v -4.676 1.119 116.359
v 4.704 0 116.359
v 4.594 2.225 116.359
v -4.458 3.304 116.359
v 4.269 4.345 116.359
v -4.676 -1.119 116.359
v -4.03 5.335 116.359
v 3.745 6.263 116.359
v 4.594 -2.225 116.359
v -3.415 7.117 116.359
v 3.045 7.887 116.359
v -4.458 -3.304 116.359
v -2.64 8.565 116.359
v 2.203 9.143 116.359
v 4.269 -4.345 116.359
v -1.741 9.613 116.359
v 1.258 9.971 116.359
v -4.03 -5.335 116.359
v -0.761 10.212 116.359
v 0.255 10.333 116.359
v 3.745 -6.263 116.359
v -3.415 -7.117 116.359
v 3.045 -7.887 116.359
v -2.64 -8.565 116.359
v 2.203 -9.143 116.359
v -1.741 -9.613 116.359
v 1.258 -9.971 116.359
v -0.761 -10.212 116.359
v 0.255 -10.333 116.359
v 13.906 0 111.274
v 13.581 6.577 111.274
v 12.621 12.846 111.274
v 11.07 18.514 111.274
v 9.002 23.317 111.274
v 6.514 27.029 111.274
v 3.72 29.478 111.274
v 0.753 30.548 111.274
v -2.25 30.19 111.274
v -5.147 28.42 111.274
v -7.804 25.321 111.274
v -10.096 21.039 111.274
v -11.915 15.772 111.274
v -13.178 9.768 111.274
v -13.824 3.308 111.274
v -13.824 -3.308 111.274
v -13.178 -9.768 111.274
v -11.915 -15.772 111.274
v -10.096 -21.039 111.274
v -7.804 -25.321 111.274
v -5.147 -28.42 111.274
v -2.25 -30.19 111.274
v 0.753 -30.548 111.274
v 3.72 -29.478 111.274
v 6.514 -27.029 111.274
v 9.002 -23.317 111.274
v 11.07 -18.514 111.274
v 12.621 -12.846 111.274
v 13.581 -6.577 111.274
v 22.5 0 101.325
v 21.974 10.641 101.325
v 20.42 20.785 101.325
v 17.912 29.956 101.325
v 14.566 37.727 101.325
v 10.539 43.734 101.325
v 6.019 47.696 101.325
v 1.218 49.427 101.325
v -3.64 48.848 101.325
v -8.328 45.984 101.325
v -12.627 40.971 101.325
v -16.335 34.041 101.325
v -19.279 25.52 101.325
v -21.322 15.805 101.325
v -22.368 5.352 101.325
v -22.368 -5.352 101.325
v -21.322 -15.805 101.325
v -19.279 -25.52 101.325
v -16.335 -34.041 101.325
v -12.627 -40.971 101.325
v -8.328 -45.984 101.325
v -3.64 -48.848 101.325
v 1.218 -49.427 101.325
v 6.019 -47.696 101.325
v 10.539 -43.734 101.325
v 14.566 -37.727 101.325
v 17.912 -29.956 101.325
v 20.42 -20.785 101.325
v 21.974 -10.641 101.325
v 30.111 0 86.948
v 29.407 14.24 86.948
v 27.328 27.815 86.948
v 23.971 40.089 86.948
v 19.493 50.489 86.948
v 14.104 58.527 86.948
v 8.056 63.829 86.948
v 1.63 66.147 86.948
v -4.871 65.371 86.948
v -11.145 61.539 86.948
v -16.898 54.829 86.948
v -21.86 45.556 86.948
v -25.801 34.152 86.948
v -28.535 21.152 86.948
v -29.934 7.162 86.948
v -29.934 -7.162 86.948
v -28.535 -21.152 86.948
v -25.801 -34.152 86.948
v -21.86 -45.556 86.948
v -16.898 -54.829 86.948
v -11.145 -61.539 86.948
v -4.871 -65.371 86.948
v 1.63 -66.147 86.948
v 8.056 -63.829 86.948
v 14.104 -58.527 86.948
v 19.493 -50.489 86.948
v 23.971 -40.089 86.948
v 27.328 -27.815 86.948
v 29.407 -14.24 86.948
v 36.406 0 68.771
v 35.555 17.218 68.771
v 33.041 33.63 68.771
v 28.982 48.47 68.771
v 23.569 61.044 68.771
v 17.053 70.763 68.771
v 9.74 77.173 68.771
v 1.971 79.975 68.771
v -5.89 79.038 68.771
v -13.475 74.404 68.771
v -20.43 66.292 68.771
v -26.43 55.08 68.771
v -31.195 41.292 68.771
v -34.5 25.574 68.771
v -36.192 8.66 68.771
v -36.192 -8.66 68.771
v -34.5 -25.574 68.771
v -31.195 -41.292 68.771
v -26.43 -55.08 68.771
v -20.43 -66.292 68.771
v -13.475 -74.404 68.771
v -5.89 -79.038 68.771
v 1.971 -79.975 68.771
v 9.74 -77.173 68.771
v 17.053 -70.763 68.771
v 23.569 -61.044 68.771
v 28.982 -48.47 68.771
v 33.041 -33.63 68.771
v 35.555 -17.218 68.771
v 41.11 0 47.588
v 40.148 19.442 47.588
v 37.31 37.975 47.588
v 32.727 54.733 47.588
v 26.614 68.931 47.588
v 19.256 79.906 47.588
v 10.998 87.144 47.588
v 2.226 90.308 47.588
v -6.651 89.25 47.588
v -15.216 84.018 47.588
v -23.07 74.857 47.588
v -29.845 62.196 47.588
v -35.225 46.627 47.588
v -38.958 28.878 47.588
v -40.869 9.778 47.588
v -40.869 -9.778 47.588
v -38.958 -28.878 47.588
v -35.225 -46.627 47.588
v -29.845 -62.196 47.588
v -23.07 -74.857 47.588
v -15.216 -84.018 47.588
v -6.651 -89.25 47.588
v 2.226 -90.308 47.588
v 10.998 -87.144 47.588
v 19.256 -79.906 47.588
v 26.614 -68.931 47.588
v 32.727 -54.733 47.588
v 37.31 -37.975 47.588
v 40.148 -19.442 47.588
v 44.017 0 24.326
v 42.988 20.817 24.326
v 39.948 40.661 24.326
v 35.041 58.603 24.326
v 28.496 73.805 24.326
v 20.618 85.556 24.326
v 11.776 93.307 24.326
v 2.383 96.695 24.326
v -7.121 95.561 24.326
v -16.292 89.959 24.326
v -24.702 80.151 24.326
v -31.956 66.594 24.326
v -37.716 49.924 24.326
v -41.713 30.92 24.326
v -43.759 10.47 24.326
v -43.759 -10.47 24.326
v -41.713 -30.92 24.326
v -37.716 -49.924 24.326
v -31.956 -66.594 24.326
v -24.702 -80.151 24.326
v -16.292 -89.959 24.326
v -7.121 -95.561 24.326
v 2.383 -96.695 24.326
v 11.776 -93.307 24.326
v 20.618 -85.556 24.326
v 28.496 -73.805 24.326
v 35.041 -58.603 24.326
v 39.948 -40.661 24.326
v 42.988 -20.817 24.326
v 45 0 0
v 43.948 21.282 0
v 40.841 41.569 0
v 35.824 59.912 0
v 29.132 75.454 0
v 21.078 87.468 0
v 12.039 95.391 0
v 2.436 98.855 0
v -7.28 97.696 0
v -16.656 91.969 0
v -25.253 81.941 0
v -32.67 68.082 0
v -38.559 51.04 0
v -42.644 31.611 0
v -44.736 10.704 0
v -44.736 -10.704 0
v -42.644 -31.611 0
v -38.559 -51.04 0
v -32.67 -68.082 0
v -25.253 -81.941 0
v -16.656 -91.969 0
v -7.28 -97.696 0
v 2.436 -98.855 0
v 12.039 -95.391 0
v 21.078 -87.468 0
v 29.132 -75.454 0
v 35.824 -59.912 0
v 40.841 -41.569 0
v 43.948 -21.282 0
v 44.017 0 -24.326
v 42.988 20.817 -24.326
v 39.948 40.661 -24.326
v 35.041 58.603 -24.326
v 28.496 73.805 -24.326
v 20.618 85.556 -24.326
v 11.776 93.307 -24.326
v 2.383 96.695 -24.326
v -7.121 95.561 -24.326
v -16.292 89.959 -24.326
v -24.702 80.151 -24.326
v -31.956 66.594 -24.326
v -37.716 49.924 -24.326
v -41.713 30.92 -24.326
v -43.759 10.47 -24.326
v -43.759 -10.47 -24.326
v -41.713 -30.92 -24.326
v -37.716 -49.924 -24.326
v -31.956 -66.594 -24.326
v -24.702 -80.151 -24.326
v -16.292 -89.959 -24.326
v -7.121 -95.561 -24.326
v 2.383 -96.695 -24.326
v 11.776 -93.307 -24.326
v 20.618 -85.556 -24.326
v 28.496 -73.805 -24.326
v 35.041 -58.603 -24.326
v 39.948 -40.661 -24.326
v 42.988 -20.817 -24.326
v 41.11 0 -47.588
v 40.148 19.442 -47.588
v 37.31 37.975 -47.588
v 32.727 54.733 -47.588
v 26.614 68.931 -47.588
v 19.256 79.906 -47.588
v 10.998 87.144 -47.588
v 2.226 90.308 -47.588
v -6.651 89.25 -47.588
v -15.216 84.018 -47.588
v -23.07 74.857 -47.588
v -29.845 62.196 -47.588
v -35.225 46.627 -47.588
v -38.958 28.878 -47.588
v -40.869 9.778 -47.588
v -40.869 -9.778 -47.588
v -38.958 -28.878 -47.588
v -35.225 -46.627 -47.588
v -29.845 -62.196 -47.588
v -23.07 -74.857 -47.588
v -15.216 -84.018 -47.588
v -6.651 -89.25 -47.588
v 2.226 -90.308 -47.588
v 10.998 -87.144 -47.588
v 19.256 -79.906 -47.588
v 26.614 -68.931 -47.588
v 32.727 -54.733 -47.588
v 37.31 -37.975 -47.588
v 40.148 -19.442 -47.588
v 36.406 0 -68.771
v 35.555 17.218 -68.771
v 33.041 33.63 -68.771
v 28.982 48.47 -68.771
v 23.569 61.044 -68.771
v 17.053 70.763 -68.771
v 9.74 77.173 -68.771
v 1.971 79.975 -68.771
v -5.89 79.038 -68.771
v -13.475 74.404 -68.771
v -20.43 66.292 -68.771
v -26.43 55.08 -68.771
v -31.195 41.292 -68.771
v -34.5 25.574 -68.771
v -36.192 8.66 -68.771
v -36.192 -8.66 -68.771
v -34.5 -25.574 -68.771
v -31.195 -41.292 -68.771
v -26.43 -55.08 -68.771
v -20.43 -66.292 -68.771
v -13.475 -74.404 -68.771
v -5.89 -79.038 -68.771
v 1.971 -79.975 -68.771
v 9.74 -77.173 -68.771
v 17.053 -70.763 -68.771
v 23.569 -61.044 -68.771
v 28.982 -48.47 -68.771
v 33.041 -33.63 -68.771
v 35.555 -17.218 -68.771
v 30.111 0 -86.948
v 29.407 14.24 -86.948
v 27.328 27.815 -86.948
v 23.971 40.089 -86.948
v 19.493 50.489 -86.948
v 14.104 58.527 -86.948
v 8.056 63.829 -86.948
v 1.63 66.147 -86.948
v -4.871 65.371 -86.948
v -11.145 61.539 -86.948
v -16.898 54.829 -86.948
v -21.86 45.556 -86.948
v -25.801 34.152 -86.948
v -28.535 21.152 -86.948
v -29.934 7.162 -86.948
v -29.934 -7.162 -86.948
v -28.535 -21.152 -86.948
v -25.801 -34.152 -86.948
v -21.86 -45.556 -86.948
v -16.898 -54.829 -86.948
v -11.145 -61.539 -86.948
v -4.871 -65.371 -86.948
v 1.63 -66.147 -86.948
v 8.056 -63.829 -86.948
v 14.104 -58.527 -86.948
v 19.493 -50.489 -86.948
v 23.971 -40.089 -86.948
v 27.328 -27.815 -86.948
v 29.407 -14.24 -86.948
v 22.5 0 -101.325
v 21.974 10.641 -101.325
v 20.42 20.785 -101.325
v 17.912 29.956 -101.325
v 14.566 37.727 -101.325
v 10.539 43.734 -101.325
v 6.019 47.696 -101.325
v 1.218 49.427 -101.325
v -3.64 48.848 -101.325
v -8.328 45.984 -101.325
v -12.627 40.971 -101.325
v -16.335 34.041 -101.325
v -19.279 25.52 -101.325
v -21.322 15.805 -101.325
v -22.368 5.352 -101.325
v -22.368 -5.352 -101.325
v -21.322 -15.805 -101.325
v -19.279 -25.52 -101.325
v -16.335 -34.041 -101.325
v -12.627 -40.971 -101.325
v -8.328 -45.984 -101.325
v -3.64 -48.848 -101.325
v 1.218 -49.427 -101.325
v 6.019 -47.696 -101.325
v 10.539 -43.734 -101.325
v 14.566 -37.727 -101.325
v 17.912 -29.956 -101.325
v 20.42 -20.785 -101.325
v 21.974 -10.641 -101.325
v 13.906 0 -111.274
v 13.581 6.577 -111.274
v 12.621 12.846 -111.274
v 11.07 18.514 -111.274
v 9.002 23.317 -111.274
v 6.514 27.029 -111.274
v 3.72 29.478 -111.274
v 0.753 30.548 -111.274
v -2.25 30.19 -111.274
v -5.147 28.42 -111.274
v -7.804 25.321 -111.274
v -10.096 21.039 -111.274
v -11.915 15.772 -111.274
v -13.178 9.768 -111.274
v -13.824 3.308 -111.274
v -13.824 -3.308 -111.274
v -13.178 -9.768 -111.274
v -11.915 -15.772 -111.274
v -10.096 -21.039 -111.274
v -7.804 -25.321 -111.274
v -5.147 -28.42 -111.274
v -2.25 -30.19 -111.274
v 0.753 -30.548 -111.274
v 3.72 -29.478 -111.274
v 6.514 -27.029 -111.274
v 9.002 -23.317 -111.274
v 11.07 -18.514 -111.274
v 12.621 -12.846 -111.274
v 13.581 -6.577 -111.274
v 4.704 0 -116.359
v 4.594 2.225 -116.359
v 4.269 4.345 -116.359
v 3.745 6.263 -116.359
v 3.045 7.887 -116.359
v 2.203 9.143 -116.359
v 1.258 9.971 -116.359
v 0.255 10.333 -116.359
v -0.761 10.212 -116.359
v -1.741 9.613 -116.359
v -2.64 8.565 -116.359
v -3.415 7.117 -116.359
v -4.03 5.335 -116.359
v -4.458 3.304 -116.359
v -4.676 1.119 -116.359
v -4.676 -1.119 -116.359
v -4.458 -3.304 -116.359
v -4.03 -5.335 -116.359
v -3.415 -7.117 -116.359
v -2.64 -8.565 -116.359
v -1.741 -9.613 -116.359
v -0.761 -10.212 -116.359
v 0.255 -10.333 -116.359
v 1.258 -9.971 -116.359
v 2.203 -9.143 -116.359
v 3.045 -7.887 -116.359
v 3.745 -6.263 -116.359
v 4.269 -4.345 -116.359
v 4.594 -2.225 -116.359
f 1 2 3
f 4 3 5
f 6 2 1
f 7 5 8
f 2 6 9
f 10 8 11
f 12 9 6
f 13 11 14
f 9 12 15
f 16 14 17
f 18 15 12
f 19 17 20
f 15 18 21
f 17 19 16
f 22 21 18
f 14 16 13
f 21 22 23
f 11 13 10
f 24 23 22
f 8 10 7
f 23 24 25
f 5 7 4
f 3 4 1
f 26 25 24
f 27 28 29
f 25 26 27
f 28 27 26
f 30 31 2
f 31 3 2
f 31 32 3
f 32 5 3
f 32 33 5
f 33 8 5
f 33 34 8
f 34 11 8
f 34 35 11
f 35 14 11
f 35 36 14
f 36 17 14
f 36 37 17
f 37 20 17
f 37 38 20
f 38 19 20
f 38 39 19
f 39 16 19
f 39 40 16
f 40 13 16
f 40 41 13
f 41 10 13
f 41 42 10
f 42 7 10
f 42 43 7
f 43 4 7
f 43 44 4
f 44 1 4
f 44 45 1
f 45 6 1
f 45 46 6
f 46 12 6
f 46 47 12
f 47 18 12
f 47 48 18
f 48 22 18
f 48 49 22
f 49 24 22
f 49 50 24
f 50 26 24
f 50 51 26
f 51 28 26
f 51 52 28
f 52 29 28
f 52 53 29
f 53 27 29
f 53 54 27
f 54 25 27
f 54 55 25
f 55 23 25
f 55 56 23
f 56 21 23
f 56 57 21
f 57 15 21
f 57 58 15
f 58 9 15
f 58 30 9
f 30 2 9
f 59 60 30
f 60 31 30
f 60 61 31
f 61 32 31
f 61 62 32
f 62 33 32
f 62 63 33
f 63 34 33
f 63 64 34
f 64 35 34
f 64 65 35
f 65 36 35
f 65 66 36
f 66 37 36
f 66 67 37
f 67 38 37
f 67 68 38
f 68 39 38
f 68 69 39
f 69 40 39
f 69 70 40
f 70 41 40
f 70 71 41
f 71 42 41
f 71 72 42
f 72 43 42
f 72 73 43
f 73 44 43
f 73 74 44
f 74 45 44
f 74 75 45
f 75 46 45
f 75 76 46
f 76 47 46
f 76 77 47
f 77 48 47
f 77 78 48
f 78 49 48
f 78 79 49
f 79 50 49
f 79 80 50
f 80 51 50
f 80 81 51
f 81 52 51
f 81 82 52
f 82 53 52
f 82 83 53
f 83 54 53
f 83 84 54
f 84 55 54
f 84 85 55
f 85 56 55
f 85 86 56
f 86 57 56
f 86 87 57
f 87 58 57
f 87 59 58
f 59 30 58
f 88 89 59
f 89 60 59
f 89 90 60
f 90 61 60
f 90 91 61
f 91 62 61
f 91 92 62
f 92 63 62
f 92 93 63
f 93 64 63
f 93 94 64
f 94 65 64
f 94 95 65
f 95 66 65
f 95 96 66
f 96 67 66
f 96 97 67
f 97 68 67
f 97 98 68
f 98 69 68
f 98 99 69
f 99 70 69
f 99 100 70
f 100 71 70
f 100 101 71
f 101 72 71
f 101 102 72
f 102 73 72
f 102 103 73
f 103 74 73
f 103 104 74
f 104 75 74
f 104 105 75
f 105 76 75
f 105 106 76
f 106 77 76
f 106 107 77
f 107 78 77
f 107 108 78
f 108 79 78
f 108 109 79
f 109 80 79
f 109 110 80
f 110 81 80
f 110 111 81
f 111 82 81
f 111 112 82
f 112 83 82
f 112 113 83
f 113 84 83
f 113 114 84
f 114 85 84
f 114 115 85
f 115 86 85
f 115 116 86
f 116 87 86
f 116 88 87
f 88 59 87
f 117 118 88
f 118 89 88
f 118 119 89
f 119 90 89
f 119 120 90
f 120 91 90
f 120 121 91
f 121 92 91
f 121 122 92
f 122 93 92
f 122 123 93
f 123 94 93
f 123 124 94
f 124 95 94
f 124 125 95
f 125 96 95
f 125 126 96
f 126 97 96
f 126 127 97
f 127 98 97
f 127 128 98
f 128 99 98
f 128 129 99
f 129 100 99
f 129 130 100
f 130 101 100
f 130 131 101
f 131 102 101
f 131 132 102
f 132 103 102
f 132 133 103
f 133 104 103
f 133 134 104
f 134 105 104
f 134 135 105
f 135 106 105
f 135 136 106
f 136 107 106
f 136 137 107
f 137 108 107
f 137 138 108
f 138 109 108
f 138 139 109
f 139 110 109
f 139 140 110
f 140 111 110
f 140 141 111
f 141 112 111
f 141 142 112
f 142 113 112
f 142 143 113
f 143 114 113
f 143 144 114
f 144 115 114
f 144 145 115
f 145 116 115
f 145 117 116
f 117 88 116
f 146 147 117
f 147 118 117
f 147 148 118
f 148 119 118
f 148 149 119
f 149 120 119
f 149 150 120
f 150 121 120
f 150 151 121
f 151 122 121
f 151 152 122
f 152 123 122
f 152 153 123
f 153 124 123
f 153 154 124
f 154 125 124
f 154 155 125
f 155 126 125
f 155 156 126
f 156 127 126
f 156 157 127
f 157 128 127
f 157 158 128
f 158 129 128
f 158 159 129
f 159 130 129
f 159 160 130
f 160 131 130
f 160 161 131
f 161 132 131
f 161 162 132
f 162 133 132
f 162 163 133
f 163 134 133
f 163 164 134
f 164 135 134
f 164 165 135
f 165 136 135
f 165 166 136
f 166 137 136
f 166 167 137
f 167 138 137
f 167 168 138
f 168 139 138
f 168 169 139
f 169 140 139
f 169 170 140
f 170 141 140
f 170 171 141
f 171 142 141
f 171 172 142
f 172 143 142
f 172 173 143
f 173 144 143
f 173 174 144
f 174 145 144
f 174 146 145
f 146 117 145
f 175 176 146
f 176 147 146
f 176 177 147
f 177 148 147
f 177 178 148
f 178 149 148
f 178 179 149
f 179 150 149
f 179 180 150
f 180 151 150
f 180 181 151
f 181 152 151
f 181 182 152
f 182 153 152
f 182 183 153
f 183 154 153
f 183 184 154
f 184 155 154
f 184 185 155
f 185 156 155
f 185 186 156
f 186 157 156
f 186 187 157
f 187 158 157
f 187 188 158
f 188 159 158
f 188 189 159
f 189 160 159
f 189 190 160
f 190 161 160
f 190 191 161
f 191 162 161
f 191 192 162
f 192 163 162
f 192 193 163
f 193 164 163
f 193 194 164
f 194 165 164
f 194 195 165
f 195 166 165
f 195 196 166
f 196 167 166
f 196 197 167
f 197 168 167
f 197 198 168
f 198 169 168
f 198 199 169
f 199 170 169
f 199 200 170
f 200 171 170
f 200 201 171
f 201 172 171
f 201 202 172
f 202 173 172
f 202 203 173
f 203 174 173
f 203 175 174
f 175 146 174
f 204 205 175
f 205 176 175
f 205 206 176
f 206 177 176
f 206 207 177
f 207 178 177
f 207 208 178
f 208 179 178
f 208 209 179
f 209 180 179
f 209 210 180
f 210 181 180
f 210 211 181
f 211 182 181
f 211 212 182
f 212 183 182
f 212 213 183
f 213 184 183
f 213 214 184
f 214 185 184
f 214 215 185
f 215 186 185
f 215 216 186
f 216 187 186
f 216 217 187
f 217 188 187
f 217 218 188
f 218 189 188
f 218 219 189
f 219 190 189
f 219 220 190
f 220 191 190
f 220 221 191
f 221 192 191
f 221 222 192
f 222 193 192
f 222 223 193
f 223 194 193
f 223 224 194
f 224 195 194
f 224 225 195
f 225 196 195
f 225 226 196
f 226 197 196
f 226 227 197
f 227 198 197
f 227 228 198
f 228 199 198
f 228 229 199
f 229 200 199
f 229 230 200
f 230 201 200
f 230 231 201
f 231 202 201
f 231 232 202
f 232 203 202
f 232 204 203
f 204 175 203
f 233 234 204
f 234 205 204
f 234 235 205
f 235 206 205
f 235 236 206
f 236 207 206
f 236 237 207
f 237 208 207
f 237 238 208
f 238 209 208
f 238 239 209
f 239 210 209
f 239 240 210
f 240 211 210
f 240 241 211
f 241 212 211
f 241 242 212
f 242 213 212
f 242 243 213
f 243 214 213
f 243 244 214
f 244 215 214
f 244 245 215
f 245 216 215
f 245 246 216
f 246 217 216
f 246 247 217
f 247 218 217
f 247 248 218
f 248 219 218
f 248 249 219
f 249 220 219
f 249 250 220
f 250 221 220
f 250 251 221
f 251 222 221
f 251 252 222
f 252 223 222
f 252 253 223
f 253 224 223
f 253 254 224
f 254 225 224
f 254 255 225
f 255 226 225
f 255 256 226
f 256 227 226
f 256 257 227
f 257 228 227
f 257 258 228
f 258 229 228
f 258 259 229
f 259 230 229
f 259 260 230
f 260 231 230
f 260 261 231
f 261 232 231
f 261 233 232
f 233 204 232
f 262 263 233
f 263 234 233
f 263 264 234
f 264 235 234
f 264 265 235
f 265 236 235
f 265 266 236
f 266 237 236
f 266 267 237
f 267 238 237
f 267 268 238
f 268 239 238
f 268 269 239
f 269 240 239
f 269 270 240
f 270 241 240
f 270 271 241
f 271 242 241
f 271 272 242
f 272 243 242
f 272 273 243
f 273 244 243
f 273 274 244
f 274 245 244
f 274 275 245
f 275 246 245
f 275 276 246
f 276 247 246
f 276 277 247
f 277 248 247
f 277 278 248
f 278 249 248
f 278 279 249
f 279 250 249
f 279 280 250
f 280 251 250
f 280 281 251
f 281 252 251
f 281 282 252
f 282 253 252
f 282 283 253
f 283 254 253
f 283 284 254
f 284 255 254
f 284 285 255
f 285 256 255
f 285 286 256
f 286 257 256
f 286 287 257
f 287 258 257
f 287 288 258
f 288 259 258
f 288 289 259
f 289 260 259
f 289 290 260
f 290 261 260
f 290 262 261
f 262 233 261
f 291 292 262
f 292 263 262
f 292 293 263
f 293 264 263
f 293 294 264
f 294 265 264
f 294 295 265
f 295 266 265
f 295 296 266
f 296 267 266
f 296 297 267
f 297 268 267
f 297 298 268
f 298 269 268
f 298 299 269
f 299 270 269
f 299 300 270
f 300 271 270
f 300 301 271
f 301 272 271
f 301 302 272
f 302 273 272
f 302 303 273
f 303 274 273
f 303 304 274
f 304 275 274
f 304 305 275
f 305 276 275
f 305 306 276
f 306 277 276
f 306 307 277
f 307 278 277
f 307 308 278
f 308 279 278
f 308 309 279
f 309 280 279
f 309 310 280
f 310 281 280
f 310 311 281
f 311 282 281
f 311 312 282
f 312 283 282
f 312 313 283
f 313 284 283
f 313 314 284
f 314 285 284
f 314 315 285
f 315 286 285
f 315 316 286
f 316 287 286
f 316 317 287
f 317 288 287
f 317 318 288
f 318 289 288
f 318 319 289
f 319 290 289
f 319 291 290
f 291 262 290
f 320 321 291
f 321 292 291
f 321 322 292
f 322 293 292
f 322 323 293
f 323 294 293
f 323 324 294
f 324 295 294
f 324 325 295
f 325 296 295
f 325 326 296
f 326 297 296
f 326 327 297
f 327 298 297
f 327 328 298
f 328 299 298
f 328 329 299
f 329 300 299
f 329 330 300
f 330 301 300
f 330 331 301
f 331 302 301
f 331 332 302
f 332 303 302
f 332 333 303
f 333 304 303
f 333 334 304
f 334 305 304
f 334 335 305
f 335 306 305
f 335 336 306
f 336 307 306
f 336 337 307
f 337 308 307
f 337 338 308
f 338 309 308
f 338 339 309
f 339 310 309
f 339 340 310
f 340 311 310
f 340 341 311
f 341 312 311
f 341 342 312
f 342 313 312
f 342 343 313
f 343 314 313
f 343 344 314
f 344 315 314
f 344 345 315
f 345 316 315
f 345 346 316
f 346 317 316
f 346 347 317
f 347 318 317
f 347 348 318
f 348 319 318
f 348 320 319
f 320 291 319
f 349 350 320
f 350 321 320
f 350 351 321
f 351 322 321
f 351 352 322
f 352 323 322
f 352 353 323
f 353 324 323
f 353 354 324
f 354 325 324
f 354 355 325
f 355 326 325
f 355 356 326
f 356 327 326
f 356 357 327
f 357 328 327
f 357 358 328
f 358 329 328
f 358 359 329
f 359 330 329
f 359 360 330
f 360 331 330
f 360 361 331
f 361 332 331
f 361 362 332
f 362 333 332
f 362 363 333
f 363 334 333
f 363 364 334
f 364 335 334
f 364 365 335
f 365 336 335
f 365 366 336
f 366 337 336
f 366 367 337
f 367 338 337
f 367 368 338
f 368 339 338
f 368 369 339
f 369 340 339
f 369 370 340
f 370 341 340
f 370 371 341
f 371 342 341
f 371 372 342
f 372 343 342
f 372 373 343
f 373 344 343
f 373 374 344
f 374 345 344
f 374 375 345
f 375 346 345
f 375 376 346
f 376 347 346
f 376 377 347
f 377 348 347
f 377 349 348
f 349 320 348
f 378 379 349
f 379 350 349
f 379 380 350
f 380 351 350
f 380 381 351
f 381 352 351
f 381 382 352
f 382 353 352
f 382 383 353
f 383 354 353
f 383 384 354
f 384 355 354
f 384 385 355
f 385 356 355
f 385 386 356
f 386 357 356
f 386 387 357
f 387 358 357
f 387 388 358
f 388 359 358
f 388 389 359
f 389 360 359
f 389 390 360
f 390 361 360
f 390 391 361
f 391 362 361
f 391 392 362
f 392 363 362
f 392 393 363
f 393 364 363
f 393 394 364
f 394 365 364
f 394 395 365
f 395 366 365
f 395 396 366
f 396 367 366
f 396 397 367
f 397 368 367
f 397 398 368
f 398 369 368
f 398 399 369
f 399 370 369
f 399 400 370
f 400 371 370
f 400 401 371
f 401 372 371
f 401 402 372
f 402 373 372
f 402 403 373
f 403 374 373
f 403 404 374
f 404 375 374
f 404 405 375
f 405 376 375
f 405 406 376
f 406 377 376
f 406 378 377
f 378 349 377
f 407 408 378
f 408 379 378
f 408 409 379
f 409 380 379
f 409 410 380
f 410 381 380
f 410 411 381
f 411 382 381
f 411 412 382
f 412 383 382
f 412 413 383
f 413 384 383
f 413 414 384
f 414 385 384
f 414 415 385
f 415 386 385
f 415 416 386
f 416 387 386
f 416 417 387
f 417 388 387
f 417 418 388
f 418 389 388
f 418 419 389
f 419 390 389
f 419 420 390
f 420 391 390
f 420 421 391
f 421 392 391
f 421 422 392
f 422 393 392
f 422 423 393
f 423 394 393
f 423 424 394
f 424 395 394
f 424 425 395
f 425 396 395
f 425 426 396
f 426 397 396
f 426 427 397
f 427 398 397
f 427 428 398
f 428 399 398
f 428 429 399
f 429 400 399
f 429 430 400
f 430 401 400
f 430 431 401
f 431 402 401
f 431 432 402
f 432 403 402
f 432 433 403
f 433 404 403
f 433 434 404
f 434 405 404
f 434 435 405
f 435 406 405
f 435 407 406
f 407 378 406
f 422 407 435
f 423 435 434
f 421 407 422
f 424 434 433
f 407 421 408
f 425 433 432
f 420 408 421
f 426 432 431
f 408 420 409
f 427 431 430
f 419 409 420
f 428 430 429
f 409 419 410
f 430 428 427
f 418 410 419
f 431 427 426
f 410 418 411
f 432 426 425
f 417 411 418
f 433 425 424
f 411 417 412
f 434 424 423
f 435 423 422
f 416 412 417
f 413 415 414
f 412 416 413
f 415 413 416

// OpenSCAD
// Generated by SolidPython 1.0.1 on 2020-07-29 00:46:46


scale(v = [5, 11, 13]) {
	sphere(r = 9);
}
/***********************************************
*********      SolidPython code:      **********
************************************************
 
# import packages: SolidPython
from solid import *
from solid.utils import *
from itertools import chain, combinations, permutations


class Resize:

    def __init__(self, scad_file):
        self.scad_file = scad_file
        #self.scad_file = import_scad(scad_file)
        # cone/cylinder param:
        self.r1 = 0
        self.r2 = 0
        self.h = 0
        # rectangular prism param:
        self.w = 0
        self.l = 0
        # ellipse param:
        self.r = 0

    # import OpenScad code (file name corresponds to shape)


    # classify shape + parameters
    def assign(self, param1, param2, param3):
        if self.scad_file == 'cone.scad':
            self.r1 = param1
            self.r2 = param2
            self.h = param3
        elif self.scad_file == 'cylinder.scad':
            self.r1 = param1
            self.r2 = param2
            self.h = param3
        elif self.scad_file == 'rectangularPrism.scad':
            self.h = param1
            self.l = param2
            self.w = param3
        else:
            self.r = param1
            self.h = param2

    # resize parameters
    def iterate(self):
        x = range(3, 20, 2)
        i = 1
        if self.scad_file == 'cone.scad':
            tempList = list(permutations(x, 2))
            for temp in tempList:
                param1 = temp[0]
                param2 = temp[1]
                filepath = 'produced_scad_files/' + 'cone' + str(param1) + '_' + str(param2) + '_' + '.scad'
                scad_render_to_file(cylinder(h=param1, r1=param2, r2=0), filepath)

        elif self.scad_file == 'cylinder.scad':
            tempList = list(permutations(x, 3))
            for temp in tempList:
                param1 = temp[0]
                param2 = temp[1]
                filepath = 'produced_scad_files/' + 'cylinder' + str(param1) + '_' + str(param2) + '_' + '.scad'
                scad_render_to_file(cylinder(h=param1, r1=param2, r2=param2), filepath)

        elif self.scad_file == 'rectangularPrism.scad':
            tempList = list(permutations(x, 3))
            for temp in tempList:
                param1 = temp[0]
                param2 = temp[1]
                param3 = temp[2]
                filepath = 'produced_scad_files/' + 'rectangularPrism' + str(param1) + '_' + str(param2) + '_' + str(
                    param3) + '.scad'
                scad_render_to_file(cube(size=(param1, param2, param3)), filepath)

        elif self.scad_file == 'ellipse.scad':
            tempList = list(permutations(x, 4))
            for temp in tempList:
                param1 = temp[0]
                param2 = temp[1]
                param3 = temp[2]
                param4 = temp[3]
                filepath = 'produced_scad_files/' + 'ellipse' + str(param1) + '_' + str(param2) + '_' + str(param3) + '_' + str(param4) + '.scad'
                scad_render_to_file(scale([param1, param2, param3])(sphere(r=param4)), filepath)

    def render_to_scadfile(self):
        scad_render_to_file(scad, 'example.scad') 
 
************************************************/
